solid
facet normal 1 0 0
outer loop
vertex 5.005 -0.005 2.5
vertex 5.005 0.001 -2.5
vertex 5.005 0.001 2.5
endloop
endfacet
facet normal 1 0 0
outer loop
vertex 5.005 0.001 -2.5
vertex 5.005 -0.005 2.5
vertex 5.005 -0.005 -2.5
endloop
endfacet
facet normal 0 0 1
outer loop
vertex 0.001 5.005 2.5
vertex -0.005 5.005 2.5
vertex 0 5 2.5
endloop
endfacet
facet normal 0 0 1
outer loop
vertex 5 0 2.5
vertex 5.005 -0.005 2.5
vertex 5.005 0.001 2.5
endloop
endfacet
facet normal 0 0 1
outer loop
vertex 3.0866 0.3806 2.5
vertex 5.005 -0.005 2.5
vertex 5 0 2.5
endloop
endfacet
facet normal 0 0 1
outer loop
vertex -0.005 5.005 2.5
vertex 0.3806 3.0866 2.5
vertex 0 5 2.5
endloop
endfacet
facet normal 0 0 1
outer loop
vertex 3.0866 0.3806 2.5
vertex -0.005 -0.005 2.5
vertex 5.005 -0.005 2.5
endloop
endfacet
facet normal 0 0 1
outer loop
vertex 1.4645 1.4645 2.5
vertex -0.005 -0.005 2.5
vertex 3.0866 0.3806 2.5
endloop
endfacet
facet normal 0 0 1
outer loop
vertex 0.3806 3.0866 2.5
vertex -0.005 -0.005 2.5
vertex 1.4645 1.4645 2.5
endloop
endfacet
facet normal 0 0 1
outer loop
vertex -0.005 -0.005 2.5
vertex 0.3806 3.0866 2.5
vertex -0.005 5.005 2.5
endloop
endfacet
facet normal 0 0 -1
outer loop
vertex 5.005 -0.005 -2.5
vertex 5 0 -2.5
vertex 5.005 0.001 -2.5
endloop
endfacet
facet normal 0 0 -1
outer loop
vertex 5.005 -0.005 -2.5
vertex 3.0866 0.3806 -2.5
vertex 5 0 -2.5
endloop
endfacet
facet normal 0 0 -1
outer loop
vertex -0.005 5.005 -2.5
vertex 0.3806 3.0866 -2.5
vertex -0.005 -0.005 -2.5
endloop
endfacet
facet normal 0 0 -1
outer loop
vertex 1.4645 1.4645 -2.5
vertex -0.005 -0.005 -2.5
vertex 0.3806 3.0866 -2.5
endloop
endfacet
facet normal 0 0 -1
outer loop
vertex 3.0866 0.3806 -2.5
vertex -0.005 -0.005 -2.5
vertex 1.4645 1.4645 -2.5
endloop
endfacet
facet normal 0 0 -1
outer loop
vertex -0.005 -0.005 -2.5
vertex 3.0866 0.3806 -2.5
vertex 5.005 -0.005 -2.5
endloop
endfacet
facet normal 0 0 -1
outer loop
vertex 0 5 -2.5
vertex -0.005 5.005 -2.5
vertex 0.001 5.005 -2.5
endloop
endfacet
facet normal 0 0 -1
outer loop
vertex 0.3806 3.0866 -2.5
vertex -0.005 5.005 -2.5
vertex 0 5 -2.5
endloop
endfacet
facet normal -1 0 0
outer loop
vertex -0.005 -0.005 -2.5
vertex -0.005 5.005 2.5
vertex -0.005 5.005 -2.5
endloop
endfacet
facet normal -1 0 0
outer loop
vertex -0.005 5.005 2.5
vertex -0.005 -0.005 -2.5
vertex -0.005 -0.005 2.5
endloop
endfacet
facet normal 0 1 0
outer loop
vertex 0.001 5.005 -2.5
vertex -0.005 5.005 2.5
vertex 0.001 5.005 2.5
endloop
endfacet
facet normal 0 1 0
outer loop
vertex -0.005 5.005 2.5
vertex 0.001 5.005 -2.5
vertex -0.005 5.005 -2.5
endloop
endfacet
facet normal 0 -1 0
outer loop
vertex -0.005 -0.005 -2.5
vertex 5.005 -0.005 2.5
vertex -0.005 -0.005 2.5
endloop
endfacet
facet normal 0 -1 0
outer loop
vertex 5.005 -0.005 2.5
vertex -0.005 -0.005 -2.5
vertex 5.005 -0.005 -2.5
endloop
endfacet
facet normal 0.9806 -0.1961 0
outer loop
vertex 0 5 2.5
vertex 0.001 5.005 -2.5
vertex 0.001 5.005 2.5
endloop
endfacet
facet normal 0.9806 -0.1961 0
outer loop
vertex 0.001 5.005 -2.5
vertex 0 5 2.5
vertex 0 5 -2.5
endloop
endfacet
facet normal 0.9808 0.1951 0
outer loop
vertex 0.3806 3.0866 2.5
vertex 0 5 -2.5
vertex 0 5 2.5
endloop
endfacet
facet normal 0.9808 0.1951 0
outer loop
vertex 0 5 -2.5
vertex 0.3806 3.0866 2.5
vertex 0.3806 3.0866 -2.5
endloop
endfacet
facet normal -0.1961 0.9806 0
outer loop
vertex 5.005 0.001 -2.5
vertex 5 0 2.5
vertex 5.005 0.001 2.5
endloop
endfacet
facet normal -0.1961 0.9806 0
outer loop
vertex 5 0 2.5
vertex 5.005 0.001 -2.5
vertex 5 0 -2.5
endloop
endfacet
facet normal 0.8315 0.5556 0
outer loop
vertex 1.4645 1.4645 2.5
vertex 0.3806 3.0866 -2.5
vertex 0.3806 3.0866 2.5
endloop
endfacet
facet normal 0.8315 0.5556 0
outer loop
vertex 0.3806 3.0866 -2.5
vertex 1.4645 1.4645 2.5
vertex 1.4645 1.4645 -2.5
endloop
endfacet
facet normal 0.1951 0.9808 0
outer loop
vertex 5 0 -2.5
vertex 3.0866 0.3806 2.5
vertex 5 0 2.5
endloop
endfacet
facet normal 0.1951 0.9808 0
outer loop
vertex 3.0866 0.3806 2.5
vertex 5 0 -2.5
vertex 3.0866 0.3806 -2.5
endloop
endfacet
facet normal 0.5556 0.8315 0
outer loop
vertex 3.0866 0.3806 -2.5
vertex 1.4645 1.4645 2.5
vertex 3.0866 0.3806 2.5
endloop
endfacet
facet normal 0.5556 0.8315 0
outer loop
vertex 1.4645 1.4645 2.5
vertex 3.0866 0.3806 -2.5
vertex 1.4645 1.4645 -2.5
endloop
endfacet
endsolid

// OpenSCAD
module fillet(r, h) {
    translate([r / 2, r / 2, 0])

        difference() {
            cube([r + 0.01, r + 0.01, h], center = true);

            translate([r/2, r/2, 0])
                cylinder(r = r, h = h + 1, center = true);

        }
}

fillet(5, 5);
